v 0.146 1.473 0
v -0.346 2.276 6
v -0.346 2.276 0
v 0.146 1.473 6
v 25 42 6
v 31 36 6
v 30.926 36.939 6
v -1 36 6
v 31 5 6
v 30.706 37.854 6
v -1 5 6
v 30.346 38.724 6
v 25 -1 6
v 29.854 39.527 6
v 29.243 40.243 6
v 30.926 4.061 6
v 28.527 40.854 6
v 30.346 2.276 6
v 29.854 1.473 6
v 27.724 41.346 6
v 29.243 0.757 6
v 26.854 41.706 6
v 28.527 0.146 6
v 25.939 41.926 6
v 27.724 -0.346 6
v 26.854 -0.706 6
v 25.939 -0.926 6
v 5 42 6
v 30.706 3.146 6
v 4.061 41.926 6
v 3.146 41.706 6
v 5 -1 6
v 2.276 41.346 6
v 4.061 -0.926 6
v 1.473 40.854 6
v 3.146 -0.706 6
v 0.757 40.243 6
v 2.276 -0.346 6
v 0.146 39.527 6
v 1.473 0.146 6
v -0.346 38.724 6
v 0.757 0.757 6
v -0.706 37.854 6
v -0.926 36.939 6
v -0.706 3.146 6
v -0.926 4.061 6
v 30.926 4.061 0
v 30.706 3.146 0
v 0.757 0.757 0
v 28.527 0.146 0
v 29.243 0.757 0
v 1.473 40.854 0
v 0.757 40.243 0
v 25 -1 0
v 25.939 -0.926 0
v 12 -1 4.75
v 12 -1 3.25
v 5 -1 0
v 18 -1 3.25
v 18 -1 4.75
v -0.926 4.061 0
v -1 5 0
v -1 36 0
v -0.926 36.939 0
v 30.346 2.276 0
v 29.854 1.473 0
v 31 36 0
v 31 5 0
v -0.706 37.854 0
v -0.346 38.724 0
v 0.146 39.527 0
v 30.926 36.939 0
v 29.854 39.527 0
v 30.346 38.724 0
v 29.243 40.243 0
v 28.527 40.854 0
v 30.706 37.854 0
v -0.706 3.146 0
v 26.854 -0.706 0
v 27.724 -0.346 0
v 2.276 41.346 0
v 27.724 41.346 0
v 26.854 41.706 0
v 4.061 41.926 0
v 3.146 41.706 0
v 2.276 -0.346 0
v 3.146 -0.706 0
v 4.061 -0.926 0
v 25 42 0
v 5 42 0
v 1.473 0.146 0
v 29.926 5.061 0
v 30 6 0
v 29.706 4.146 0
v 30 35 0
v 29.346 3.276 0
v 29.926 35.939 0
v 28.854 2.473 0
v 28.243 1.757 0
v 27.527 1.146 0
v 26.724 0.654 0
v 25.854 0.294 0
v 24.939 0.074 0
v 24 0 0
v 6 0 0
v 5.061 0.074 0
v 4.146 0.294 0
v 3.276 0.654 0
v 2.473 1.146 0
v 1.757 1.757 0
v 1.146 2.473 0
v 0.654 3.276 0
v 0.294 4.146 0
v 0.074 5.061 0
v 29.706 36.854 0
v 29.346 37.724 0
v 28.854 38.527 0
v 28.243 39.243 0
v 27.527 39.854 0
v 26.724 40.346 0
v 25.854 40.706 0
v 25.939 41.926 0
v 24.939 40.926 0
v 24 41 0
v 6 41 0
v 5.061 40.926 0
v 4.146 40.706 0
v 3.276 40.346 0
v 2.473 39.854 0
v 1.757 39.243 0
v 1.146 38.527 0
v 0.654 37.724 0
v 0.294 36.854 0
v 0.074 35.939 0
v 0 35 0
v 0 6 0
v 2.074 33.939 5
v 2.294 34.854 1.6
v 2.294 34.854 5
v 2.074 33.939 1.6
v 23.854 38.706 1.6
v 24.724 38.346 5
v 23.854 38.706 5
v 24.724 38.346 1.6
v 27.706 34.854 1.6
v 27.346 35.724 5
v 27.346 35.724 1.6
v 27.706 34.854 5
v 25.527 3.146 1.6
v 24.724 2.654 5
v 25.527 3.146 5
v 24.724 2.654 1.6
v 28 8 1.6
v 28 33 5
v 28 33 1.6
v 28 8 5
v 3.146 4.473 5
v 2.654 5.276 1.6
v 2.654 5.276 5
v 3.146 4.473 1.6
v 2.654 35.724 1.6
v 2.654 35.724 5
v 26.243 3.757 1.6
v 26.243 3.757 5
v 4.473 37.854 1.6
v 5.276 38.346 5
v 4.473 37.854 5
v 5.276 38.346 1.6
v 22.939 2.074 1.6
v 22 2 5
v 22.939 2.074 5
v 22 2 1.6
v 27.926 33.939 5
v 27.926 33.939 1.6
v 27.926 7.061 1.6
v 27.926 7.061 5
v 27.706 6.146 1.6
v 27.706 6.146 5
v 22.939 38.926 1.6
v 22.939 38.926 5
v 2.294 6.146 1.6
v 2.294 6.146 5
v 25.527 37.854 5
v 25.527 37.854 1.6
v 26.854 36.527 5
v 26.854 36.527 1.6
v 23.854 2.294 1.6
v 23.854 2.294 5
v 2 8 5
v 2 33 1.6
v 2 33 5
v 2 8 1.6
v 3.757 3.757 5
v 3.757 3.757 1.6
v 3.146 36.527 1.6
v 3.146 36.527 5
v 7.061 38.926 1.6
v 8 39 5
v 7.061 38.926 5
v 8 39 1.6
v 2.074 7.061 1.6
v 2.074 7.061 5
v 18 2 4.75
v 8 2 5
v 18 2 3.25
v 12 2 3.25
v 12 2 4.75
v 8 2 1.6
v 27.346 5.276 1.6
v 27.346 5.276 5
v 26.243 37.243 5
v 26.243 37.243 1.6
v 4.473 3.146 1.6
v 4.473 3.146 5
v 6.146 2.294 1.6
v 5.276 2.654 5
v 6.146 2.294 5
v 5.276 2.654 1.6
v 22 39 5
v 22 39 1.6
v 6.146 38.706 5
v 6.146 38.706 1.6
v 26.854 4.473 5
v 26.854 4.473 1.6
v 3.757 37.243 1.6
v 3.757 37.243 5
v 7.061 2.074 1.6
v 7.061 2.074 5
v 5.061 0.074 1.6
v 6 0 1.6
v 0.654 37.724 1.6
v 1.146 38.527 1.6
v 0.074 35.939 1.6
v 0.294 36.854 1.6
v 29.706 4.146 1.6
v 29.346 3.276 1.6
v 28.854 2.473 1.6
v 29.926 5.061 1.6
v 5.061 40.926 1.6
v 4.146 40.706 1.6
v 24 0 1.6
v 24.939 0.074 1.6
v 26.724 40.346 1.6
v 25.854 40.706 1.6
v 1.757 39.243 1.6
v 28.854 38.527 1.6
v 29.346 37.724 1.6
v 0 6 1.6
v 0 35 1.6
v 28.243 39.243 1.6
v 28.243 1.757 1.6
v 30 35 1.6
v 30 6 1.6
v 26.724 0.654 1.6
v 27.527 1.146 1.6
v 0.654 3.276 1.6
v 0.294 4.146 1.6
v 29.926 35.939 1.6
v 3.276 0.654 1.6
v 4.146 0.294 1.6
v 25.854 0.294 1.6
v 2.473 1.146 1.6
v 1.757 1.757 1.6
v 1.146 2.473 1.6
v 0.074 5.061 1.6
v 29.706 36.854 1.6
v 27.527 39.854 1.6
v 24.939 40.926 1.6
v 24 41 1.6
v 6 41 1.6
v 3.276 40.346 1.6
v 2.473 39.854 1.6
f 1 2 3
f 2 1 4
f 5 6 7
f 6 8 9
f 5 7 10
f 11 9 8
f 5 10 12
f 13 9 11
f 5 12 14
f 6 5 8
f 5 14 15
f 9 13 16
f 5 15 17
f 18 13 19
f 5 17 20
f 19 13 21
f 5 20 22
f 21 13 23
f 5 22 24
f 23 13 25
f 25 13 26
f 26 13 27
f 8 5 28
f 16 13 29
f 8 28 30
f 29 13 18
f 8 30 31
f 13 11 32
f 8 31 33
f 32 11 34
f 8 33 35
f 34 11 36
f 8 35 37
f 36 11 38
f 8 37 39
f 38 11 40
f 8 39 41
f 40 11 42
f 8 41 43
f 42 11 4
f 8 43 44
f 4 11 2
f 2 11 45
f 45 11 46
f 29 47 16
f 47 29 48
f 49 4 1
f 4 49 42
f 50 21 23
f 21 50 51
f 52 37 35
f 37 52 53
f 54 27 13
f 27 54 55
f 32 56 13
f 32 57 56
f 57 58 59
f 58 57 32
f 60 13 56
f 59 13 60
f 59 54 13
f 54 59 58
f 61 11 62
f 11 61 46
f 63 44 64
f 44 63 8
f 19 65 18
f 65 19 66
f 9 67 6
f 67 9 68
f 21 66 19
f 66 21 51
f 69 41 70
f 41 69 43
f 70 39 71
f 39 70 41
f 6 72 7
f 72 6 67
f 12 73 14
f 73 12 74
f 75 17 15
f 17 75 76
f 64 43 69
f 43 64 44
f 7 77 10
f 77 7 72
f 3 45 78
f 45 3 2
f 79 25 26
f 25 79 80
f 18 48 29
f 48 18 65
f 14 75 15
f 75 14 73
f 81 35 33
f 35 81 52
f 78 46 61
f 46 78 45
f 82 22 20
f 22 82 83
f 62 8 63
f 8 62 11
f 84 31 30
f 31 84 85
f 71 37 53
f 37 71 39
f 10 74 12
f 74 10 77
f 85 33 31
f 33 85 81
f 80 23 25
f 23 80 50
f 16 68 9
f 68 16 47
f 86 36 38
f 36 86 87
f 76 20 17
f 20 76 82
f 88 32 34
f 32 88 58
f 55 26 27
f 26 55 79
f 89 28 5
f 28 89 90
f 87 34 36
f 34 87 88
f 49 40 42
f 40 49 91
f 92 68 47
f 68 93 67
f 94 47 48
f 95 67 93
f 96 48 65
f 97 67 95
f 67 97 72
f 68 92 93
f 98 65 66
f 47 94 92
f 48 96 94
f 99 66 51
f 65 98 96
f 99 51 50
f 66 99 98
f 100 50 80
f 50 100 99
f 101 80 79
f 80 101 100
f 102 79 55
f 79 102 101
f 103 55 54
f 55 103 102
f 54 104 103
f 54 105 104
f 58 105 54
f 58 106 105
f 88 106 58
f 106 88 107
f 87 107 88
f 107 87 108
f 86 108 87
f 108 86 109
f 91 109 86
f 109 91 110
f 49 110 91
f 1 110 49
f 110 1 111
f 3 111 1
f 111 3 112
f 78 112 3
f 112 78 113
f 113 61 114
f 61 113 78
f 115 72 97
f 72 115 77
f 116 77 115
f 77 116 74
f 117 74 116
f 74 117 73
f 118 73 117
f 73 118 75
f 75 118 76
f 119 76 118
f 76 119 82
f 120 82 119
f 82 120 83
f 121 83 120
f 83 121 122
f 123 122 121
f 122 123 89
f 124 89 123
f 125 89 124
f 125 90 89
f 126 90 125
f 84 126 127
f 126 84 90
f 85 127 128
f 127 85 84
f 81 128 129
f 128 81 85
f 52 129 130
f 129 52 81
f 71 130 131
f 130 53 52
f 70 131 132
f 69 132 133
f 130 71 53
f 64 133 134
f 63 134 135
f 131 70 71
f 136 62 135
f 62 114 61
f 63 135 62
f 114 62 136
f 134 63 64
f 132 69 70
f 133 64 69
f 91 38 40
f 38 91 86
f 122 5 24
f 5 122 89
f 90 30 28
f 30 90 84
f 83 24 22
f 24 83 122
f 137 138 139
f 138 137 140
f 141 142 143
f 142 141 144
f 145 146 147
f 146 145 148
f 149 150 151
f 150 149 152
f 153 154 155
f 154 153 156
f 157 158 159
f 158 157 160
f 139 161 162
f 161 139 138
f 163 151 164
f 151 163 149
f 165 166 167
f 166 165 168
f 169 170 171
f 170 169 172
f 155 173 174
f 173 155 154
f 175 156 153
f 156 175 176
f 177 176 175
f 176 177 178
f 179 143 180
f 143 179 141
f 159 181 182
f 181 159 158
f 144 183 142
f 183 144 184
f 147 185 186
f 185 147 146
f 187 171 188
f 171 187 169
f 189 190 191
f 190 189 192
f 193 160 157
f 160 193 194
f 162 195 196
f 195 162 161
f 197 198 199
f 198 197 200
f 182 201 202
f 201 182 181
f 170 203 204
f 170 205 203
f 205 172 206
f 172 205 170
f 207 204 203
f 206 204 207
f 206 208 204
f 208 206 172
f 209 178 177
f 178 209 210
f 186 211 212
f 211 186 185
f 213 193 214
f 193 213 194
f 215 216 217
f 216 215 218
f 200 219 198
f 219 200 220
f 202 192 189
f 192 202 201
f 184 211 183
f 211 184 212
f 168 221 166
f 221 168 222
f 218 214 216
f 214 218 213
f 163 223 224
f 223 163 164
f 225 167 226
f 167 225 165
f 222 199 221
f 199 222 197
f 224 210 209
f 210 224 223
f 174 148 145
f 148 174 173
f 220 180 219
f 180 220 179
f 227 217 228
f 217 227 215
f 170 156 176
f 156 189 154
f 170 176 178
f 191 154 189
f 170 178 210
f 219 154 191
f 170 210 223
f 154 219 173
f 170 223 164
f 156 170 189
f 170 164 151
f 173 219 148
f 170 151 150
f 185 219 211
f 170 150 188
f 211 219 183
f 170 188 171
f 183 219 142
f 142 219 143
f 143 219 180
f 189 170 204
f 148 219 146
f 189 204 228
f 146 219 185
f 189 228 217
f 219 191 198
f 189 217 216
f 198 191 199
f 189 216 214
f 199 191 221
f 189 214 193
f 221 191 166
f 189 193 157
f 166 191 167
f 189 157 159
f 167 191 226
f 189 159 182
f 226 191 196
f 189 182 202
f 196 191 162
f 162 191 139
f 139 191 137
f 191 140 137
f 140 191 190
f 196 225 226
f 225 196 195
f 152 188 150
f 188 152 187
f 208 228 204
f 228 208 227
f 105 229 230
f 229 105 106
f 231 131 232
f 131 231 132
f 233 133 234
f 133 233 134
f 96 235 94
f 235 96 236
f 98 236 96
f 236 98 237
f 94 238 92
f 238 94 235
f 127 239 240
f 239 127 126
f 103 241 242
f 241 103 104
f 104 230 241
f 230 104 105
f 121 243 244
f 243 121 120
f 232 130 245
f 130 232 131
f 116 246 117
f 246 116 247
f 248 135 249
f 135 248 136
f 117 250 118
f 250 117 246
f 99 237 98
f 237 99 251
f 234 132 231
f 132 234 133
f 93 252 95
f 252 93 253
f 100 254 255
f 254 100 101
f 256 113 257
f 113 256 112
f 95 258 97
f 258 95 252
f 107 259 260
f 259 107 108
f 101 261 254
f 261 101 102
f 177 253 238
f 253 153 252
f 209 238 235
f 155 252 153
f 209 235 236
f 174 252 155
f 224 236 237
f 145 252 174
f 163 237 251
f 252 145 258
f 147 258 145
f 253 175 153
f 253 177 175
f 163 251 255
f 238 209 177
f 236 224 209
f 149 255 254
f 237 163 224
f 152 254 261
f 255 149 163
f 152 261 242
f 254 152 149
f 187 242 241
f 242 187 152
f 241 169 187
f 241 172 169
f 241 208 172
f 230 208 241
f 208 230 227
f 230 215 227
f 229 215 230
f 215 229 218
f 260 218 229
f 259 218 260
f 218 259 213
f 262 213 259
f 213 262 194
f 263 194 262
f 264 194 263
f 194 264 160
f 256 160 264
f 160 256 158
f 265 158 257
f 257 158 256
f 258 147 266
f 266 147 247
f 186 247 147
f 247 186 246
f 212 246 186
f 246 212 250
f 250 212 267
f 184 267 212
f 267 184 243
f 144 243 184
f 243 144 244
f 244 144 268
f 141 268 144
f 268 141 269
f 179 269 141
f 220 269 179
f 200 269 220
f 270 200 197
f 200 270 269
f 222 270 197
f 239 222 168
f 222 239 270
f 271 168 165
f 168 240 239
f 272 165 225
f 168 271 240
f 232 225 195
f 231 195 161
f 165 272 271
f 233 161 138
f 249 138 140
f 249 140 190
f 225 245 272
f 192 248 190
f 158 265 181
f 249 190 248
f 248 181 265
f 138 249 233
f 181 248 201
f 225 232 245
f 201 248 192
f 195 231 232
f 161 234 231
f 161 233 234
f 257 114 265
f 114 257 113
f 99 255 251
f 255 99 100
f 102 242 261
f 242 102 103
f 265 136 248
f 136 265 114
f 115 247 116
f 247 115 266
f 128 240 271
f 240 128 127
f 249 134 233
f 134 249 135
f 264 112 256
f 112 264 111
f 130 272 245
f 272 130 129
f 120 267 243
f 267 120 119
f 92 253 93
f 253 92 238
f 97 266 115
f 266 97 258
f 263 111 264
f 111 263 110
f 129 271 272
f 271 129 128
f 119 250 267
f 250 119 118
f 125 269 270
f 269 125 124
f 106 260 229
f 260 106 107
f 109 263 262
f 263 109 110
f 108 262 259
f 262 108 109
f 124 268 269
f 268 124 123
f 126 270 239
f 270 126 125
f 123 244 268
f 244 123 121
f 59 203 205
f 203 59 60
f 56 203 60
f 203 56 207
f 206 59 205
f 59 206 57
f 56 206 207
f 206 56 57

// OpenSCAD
$fn=40;  // Alto número de caras de polígonos

a = 6; // altura
ap=1; // ancho pared;
as = 2; // solapa
xi = 30; // ancho interno
yi = 41; // largo interno
rc = 6; // radio curvatura
gpcb = 1.6; // grosor del pcb

difference(){
// Borde exterior de la caja
    translate([-ap,-ap,0]){
        caja(xi+2*ap,yi+2*ap,a,rc);
    }

    // Agujero principal
    translate([as,as,-1]){
        caja(xi-2*as,yi-2*as,a+1-ap,rc);
    }
   
    // caladura para soportar pcb
    translate([0,0,-1]){
        caja(xi,yi,gpcb+1,rc);
    }
   
    
    // ranura pasacable
    d=6;
    translate([xi/2,-1,a-ap-1]){
        cube([d,20,1.5],center=true);
    };


}


module caja(xi, yi, a, rc){
    
    hull(){
        translate([0+rc,0+rc,0]){
            cylinder(a,rc,rc);
        }
        translate([xi-rc,0+rc,0]){
            cylinder(a,rc,rc);
        }
        translate([0+rc,yi-rc,0]){
            cylinder(a,rc,rc);
        }
        translate([xi-rc,yi-rc,0]){
            cylinder(a,rc,rc);
        }
   
};
    
    }
